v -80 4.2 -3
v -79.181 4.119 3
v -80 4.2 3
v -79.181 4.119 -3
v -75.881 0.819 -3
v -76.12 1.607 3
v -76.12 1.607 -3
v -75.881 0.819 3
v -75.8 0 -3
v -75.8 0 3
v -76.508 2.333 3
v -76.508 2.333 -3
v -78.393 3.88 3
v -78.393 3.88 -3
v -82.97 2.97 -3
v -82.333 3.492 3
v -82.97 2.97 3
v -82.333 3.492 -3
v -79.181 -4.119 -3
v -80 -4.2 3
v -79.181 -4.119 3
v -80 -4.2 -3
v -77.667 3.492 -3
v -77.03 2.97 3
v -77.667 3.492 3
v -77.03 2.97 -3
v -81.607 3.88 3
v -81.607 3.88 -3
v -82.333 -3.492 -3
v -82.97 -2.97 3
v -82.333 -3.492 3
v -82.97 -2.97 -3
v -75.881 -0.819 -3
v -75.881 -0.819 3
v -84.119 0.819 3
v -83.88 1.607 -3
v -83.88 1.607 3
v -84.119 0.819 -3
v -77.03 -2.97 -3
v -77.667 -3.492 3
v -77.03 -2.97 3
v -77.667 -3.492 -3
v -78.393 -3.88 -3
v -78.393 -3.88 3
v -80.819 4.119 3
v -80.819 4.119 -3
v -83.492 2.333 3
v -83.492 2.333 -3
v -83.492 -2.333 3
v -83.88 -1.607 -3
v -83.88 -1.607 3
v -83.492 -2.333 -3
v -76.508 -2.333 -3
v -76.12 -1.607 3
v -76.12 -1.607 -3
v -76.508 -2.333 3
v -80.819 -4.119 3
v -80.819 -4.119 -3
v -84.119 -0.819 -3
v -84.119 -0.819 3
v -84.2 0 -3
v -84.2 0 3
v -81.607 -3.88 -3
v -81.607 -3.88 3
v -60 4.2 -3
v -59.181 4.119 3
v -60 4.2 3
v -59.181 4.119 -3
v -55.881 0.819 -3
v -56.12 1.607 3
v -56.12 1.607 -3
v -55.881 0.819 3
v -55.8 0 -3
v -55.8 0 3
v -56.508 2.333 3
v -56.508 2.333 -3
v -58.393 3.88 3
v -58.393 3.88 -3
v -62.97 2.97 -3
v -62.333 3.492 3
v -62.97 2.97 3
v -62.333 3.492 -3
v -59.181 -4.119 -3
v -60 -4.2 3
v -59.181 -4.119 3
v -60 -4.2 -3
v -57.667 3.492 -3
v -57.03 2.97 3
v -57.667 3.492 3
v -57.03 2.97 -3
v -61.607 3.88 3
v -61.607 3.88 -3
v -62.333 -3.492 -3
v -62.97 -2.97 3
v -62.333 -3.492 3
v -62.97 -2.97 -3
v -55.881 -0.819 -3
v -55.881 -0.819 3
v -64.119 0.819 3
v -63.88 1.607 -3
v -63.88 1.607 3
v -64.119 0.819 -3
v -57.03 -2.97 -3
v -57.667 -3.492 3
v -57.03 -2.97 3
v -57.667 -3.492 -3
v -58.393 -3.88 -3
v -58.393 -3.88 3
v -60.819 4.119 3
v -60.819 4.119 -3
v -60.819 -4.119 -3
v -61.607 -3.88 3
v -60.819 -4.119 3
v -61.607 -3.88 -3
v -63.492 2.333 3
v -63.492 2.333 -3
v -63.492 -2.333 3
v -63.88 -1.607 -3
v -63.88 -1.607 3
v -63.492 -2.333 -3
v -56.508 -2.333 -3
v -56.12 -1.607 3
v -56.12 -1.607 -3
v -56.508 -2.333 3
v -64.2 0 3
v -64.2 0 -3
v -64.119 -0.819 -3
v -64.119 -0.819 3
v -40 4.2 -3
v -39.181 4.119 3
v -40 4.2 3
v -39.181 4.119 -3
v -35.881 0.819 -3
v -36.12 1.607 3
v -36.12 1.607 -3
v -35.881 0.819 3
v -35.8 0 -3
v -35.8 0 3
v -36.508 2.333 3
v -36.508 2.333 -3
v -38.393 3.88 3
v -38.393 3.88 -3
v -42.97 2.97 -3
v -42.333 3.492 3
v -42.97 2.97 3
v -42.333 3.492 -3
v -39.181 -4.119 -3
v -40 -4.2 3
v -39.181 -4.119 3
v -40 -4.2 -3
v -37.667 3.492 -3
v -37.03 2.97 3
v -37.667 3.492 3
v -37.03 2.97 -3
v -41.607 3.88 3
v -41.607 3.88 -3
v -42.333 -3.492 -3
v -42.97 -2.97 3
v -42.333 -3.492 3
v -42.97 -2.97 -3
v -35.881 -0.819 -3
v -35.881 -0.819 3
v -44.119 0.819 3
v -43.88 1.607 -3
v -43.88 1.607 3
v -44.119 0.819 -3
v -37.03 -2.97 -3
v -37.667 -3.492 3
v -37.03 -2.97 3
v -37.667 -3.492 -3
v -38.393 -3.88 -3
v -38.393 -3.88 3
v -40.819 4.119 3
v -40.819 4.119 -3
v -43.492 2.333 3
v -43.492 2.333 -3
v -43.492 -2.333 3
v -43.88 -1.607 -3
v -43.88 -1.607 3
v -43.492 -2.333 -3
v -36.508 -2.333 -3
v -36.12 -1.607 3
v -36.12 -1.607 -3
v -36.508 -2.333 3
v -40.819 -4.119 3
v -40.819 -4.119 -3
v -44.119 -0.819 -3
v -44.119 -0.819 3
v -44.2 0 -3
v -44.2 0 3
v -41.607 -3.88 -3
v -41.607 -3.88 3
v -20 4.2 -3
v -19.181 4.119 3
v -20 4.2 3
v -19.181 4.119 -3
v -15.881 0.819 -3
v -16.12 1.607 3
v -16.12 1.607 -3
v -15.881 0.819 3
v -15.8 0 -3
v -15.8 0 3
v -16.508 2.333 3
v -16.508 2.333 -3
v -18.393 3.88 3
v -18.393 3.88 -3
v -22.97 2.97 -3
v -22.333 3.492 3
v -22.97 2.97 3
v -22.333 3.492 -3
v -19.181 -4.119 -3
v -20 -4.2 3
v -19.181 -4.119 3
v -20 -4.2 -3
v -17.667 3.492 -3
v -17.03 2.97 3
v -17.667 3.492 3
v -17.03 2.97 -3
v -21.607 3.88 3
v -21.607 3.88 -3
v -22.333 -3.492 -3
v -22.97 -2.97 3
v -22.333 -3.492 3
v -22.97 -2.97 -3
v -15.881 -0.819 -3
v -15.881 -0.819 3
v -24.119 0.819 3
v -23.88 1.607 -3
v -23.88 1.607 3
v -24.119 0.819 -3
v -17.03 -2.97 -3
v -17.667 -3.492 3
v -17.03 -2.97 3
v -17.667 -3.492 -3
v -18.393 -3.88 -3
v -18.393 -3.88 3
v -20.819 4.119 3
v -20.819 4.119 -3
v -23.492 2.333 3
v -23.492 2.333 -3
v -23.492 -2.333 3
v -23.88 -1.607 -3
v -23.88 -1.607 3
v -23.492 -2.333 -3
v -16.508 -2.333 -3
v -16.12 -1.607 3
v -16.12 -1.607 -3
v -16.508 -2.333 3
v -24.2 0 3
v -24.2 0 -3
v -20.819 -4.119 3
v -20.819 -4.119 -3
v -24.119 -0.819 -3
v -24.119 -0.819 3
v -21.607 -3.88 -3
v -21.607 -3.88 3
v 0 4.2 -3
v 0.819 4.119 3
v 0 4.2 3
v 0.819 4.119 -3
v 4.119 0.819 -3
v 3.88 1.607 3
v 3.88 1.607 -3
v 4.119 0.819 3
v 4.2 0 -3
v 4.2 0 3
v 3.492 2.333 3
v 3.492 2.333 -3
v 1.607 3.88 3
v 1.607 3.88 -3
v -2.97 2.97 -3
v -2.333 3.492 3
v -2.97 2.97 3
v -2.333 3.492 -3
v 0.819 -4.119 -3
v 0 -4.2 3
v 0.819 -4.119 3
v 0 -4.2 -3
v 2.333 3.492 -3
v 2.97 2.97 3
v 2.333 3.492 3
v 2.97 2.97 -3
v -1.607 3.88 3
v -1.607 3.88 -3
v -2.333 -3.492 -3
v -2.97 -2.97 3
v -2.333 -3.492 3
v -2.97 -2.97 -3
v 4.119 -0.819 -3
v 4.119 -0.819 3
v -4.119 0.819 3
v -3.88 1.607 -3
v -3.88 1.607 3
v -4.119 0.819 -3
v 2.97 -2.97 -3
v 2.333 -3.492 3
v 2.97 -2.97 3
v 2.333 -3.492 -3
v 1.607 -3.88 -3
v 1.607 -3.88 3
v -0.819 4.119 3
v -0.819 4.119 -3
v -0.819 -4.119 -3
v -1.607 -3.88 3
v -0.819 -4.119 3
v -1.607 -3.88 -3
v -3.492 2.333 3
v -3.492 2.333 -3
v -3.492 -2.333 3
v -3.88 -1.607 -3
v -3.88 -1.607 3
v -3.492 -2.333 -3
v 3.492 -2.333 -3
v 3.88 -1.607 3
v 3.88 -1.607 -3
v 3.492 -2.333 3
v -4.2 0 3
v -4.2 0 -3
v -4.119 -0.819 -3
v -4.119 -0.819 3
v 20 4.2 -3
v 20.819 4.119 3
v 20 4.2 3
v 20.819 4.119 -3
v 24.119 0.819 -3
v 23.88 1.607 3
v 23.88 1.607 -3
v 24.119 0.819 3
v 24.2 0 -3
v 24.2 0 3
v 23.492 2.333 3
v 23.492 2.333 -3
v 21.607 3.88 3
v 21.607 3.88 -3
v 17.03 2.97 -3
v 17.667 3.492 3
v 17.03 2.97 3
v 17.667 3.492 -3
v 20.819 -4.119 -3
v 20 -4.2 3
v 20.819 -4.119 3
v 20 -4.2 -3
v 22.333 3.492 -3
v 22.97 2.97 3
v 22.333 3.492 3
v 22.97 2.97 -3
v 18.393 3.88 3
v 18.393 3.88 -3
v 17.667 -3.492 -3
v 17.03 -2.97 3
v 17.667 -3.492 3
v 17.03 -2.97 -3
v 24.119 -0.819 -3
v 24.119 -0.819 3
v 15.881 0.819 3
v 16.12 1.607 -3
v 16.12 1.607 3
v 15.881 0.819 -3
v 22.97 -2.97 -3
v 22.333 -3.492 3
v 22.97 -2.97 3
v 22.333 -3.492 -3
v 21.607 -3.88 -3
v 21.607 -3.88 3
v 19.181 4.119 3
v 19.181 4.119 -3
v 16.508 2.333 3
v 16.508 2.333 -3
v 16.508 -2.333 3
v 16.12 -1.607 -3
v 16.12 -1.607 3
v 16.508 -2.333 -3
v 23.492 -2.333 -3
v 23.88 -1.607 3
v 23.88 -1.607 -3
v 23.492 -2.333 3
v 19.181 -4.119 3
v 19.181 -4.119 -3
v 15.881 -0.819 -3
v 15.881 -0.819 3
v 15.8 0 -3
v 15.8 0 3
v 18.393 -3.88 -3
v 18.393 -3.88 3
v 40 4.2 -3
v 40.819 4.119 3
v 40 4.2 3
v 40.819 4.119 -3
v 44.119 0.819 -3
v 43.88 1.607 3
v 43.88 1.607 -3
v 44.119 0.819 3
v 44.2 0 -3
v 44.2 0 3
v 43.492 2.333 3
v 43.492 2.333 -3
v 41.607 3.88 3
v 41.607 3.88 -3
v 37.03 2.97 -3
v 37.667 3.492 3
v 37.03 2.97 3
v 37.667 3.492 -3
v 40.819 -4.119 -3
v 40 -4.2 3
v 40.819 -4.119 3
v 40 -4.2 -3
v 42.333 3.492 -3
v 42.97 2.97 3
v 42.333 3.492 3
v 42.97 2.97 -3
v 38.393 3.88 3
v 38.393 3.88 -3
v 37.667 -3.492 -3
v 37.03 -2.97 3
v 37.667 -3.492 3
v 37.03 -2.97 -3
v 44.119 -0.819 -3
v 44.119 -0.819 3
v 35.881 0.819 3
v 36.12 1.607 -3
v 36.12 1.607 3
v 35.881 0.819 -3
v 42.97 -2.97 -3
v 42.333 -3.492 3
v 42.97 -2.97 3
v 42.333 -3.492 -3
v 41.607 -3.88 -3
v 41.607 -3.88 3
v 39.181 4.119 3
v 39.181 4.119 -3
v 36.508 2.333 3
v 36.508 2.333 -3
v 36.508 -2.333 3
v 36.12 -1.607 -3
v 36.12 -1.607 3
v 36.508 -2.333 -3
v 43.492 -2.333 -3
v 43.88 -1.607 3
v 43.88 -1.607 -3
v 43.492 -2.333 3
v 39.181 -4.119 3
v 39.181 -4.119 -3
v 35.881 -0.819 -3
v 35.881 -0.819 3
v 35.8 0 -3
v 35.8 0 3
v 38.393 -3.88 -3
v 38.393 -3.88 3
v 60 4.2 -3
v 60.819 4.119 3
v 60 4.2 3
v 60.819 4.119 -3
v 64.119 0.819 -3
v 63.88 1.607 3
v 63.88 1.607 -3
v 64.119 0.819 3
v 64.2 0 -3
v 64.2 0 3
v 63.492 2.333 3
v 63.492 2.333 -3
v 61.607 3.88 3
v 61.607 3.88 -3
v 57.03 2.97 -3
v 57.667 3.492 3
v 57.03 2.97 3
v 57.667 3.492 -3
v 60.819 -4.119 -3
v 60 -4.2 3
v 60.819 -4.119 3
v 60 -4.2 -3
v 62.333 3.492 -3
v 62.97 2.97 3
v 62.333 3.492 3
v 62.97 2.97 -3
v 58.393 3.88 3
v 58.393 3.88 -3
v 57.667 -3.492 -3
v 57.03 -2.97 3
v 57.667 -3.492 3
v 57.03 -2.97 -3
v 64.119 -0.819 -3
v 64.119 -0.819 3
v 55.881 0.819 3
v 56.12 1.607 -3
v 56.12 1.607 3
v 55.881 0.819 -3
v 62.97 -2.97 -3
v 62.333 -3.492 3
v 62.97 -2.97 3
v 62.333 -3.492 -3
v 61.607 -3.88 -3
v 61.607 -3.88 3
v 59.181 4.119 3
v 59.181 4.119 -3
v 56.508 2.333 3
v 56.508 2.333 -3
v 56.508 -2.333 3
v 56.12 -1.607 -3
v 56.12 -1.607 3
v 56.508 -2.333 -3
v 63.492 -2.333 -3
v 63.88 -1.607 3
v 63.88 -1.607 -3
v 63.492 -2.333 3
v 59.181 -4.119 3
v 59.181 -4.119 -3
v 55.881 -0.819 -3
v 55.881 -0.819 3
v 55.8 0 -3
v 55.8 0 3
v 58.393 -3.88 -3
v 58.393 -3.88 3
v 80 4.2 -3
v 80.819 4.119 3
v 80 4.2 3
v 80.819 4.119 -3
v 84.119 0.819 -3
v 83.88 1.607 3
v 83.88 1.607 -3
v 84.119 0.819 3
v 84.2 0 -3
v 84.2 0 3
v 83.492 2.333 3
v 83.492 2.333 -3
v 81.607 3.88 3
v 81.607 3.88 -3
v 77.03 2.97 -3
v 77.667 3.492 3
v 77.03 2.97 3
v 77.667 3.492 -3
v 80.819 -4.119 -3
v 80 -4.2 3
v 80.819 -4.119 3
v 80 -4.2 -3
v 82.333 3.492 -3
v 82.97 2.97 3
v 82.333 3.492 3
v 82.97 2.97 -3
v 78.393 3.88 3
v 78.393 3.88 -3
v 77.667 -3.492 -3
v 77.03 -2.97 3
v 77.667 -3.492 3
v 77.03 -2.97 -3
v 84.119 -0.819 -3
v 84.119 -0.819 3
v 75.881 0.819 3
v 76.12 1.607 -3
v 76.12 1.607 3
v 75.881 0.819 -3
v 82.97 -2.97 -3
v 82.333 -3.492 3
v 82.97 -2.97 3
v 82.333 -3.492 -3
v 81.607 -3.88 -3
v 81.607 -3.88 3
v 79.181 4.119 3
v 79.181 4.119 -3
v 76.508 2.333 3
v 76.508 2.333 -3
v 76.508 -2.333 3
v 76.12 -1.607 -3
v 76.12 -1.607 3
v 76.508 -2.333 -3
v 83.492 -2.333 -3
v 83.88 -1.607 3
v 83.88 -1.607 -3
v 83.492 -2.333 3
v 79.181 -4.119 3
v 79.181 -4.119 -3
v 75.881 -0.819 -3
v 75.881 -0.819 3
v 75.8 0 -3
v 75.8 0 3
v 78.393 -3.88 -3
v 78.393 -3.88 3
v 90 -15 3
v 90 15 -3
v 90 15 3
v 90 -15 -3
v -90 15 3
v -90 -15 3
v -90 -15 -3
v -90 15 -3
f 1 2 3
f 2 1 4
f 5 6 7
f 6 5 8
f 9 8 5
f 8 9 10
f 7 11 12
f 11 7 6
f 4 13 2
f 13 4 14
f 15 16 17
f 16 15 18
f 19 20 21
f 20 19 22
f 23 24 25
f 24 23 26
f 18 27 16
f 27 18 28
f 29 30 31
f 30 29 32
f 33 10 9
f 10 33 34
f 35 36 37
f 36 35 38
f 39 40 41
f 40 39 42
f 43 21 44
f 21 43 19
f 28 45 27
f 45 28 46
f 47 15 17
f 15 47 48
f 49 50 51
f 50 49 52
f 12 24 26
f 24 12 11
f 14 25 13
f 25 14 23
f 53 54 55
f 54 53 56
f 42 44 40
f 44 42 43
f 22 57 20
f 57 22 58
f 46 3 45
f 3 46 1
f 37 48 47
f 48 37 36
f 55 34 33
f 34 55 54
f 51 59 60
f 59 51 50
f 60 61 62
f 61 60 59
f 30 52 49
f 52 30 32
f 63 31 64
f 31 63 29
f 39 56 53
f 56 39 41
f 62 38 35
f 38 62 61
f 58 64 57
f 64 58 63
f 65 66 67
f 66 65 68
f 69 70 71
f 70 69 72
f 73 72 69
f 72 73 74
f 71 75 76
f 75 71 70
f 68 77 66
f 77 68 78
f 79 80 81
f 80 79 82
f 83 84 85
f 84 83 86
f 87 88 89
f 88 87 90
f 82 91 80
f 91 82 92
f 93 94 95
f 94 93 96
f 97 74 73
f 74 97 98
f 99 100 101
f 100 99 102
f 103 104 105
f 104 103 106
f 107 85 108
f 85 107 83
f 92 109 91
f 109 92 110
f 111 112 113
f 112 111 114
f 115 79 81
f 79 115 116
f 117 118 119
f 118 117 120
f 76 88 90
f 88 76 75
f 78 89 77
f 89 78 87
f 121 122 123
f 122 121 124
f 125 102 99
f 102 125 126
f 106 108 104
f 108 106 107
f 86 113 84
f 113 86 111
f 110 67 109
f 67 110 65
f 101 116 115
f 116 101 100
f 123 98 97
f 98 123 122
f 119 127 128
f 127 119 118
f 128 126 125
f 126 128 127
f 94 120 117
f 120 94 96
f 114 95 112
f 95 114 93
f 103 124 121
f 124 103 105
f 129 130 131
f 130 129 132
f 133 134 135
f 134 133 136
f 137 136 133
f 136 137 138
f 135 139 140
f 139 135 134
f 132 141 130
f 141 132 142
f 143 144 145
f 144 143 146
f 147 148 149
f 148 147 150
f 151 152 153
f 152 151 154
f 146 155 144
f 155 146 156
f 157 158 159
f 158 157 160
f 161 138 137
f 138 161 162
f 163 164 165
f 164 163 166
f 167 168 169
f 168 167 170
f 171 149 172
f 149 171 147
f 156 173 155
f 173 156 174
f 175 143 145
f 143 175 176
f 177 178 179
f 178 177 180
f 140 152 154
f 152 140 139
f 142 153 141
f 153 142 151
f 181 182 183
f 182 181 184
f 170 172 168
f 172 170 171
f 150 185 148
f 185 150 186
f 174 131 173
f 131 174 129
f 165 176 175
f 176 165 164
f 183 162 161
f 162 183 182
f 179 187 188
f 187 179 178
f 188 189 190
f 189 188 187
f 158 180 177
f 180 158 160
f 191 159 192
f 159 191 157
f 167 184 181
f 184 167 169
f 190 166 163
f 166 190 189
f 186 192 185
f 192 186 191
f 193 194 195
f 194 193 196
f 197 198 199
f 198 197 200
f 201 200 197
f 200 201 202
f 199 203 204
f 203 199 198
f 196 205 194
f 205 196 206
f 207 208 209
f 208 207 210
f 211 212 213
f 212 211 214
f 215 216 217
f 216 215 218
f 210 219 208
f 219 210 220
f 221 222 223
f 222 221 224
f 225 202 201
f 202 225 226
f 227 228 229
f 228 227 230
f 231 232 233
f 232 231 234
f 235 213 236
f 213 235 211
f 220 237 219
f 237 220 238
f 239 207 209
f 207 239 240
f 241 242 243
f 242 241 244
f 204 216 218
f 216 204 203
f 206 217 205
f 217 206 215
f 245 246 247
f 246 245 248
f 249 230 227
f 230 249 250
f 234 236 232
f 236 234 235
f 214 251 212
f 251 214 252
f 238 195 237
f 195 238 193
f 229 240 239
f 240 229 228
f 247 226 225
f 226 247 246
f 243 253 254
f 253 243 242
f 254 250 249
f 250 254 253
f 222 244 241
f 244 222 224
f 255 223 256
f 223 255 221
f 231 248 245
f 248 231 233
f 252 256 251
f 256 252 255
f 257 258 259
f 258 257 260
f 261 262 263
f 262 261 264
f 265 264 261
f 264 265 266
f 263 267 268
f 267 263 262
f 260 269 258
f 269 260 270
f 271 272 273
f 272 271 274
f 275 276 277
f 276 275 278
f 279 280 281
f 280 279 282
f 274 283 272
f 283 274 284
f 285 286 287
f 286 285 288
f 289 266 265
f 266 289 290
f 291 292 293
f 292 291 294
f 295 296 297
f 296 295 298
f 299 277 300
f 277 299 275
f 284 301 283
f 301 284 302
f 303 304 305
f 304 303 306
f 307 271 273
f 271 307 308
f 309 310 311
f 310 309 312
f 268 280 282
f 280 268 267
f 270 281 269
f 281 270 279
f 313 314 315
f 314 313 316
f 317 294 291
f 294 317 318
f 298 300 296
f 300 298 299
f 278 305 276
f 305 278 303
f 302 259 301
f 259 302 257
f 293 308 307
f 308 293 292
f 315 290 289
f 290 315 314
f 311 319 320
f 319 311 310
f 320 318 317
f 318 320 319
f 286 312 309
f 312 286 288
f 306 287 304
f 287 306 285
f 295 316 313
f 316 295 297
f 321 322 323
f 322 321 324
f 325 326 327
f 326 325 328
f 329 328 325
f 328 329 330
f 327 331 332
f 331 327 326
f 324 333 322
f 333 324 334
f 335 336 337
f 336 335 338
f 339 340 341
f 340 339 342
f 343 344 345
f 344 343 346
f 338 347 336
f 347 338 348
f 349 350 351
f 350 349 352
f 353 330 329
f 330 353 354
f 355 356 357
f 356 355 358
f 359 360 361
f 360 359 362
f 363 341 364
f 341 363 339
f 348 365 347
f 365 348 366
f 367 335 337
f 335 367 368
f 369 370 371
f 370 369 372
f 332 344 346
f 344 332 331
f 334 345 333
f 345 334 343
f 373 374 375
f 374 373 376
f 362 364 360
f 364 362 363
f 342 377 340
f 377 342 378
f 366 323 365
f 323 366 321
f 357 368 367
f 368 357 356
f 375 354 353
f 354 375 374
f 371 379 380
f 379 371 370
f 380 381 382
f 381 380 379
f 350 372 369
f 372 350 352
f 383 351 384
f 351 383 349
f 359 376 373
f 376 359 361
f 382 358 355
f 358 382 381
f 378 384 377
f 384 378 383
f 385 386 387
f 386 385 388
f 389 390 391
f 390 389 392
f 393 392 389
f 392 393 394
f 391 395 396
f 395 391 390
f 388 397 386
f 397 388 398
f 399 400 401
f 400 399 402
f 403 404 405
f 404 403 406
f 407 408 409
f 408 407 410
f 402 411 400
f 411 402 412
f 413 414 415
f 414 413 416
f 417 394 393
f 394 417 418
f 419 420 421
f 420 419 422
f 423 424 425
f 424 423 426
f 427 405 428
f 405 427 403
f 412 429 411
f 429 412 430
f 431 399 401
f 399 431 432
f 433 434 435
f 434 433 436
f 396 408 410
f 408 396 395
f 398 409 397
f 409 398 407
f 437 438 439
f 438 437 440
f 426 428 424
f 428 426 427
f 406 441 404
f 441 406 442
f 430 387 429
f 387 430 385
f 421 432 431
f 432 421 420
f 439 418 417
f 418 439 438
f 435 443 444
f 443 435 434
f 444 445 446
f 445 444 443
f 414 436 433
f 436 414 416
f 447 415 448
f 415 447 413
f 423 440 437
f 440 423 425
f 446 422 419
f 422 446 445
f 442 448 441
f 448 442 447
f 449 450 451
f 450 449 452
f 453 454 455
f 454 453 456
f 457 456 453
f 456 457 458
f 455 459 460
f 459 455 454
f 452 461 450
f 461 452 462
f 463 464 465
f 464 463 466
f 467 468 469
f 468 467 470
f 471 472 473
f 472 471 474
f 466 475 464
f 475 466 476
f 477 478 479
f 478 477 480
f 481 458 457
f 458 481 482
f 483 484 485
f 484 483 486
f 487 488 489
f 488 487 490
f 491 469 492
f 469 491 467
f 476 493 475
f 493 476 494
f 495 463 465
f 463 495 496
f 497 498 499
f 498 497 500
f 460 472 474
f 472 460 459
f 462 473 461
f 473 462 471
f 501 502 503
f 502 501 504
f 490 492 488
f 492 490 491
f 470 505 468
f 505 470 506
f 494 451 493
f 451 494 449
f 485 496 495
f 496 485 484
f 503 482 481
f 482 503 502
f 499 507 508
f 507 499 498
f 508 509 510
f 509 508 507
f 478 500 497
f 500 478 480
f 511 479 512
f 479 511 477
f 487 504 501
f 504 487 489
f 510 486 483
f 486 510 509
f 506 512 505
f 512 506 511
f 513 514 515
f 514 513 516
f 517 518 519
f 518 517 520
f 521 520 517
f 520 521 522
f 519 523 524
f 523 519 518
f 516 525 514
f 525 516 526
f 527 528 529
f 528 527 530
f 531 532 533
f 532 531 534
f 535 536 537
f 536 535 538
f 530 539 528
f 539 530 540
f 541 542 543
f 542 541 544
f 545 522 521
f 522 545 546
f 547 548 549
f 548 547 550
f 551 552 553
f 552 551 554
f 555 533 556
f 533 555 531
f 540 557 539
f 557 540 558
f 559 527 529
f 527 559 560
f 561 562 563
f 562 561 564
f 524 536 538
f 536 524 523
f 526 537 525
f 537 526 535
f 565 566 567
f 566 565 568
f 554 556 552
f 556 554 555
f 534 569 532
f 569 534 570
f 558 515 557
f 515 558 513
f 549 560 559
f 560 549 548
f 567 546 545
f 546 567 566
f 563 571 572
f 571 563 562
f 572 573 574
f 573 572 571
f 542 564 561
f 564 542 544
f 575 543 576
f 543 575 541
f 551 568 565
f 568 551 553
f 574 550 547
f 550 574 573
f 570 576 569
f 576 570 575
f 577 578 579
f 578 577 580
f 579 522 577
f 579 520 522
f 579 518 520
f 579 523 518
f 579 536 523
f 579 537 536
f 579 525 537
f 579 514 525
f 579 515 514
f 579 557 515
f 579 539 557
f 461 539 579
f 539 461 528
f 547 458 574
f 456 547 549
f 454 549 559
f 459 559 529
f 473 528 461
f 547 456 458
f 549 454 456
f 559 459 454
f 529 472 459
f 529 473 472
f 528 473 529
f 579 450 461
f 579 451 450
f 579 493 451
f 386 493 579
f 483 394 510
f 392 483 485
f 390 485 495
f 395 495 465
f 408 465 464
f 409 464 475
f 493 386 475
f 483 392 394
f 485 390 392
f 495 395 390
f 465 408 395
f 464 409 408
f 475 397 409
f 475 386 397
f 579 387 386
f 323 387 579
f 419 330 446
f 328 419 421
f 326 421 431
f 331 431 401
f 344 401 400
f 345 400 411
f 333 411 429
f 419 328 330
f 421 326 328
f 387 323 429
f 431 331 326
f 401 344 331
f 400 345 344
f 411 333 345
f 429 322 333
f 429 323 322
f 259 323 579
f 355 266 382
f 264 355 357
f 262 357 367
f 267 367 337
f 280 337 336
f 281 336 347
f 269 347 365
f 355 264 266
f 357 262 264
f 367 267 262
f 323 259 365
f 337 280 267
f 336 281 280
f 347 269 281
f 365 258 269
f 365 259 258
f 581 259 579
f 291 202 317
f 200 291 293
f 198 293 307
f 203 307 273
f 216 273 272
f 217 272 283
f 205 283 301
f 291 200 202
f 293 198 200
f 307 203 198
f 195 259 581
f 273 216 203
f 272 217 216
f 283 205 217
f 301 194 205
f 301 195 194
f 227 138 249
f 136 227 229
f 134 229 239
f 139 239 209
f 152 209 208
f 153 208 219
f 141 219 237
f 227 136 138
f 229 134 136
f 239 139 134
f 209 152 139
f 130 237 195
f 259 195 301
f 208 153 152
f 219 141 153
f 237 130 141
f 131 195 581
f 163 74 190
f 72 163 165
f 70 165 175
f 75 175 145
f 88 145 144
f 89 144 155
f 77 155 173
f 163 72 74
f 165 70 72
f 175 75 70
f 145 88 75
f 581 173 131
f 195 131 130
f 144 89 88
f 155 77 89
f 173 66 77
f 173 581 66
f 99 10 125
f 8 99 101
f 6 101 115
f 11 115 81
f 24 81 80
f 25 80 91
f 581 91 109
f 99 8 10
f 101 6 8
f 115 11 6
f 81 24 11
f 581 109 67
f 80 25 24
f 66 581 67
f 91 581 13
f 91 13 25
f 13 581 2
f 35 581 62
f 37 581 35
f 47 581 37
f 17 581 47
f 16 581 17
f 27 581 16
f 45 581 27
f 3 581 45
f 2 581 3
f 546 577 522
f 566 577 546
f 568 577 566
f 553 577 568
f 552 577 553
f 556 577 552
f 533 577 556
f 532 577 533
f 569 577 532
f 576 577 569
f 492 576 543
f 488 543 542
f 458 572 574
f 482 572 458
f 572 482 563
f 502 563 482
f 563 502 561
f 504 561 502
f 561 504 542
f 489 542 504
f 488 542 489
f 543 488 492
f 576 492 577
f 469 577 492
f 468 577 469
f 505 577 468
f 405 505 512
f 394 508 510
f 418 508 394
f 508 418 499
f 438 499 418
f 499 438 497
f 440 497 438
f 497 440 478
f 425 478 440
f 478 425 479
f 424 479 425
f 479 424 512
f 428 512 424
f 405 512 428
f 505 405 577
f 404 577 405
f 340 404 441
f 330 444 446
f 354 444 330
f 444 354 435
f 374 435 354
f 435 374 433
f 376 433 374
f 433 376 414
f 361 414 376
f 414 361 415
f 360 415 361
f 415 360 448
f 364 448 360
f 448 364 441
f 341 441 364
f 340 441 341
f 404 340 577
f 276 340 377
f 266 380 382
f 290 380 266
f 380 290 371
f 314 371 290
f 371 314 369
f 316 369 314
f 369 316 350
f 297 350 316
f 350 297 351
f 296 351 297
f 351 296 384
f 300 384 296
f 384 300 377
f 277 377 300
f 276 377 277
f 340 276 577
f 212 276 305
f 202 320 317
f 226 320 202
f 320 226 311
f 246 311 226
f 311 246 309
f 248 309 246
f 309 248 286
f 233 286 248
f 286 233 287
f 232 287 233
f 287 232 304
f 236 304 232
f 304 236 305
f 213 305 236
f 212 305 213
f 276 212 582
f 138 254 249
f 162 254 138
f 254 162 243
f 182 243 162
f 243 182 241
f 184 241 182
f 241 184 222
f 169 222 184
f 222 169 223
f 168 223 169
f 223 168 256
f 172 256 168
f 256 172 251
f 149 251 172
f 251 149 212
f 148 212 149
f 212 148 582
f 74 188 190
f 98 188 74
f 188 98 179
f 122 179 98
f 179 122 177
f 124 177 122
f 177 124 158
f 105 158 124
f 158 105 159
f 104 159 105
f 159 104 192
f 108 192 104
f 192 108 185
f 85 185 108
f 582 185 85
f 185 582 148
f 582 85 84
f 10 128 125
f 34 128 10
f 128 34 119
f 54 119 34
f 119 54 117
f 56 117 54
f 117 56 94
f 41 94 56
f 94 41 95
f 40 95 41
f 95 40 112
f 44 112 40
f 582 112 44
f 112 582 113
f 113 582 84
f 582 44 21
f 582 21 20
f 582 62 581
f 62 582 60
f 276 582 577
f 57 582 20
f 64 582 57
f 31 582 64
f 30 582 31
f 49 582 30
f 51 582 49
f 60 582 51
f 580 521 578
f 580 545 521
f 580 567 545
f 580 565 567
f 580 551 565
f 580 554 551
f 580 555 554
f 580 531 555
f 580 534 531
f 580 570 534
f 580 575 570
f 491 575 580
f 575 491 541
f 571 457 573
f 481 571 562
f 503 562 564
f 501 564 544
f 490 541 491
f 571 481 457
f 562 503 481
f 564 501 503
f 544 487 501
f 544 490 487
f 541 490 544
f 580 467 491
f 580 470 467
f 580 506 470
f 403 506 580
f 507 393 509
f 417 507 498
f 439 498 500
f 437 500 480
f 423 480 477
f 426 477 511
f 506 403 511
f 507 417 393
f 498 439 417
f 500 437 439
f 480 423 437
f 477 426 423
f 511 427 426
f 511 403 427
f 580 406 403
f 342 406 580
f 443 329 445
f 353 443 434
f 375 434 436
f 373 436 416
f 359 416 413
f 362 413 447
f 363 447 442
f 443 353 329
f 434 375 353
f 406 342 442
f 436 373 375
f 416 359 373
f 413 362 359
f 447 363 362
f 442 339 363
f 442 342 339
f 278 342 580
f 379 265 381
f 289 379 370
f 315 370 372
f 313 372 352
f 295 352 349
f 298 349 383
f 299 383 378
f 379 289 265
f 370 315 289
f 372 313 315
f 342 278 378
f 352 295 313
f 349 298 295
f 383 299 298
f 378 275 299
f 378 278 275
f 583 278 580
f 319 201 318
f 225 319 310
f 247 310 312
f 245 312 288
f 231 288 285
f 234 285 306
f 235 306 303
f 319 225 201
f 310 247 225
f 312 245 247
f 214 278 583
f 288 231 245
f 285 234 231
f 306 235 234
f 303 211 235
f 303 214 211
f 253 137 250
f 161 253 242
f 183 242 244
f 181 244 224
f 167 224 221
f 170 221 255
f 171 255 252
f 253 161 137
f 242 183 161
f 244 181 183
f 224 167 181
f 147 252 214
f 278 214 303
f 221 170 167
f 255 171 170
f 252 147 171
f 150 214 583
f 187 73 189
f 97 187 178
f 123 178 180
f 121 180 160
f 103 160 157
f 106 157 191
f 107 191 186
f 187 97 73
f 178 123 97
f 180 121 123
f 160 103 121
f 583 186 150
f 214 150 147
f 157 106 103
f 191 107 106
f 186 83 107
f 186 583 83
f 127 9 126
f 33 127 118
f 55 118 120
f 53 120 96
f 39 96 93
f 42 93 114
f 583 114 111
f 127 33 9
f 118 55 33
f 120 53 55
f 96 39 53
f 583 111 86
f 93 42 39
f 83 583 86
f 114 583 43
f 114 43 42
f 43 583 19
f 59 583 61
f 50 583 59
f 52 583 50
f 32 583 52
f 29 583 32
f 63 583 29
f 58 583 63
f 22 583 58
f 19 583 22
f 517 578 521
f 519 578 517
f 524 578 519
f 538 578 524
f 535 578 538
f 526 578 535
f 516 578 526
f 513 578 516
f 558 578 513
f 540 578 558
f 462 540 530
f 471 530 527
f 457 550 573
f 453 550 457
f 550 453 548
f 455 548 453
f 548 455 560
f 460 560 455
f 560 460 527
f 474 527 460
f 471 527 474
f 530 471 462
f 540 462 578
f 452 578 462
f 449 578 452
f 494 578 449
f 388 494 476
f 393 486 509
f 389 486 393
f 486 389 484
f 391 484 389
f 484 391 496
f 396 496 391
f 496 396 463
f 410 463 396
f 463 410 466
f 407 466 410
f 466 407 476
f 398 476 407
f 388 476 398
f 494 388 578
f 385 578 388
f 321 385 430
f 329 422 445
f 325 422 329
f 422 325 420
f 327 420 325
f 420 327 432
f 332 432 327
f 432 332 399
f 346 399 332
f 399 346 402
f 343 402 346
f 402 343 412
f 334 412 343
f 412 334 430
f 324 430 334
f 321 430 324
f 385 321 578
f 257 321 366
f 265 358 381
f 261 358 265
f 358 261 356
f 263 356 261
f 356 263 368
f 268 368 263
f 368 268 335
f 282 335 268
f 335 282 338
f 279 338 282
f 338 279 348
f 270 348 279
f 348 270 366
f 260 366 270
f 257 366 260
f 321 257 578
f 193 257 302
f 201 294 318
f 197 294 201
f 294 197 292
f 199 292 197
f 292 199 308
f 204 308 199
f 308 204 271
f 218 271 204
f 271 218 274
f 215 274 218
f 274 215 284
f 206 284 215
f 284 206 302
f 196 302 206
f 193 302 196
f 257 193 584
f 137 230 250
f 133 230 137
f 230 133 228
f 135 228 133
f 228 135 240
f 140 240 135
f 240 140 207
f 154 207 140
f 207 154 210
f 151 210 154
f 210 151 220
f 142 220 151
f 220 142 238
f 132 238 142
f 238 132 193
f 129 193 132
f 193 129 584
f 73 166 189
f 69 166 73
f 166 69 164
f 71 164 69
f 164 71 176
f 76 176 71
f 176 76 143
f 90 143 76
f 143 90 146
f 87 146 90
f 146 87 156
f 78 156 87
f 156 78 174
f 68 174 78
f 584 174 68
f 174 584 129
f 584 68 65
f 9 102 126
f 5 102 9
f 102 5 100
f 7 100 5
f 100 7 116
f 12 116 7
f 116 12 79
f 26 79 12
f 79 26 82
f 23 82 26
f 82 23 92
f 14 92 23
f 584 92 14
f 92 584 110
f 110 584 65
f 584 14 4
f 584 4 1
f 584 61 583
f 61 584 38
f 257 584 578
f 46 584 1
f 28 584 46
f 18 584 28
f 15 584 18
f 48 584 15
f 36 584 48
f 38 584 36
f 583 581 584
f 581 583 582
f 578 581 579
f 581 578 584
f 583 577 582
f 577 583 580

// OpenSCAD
$fn = 32;
// ----------------------------------------------------------------------
// Hole bar, 9 x Ø8.4
// row layout, 10 mm edge offset
// ----------------------------------------------------------------------

// --- parameters (mm) ---
bar_w = 30;    // bar width (Y)
bar_t = 6;     // bar thickness (Z)
holes = 9;     // holes per row
hole_d = 8.4;  // hole diameter
edge = 10;     // offset from the bar end to the first hole
pitch = 20;    // pitch between neighbouring holes

// --- derived feature positions (mm) ---
span = (holes - 1) * pitch;   // = 160   distance between the end holes
bar_l = span + 2 * edge;      // = 180   overall bar length
start_x = -bar_l / 2 + edge;  // = -80   X of the first hole
feature_centers = [
  [start_x + 0 * pitch, 0],
  [start_x + 1 * pitch, 0],
  [start_x + 2 * pitch, 0],
  [start_x + 3 * pitch, 0],
  [start_x + 4 * pitch, 0],
  [start_x + 5 * pitch, 0],
  [start_x + 6 * pitch, 0],
  [start_x + 7 * pitch, 0],
  [start_x + 8 * pitch, 0]
];   // hole centres of the first row

// bar with one row of holes, drilled from feature_centers
difference() {
  translate([-bar_l / 2, -bar_w / 2, -bar_t / 2]) cube([bar_l, bar_w, bar_t]);
  for (centre = feature_centers)
    translate([centre[0], centre[1], 0])
      cylinder(d = hole_d, h = bar_t + 2, center = true);
}
